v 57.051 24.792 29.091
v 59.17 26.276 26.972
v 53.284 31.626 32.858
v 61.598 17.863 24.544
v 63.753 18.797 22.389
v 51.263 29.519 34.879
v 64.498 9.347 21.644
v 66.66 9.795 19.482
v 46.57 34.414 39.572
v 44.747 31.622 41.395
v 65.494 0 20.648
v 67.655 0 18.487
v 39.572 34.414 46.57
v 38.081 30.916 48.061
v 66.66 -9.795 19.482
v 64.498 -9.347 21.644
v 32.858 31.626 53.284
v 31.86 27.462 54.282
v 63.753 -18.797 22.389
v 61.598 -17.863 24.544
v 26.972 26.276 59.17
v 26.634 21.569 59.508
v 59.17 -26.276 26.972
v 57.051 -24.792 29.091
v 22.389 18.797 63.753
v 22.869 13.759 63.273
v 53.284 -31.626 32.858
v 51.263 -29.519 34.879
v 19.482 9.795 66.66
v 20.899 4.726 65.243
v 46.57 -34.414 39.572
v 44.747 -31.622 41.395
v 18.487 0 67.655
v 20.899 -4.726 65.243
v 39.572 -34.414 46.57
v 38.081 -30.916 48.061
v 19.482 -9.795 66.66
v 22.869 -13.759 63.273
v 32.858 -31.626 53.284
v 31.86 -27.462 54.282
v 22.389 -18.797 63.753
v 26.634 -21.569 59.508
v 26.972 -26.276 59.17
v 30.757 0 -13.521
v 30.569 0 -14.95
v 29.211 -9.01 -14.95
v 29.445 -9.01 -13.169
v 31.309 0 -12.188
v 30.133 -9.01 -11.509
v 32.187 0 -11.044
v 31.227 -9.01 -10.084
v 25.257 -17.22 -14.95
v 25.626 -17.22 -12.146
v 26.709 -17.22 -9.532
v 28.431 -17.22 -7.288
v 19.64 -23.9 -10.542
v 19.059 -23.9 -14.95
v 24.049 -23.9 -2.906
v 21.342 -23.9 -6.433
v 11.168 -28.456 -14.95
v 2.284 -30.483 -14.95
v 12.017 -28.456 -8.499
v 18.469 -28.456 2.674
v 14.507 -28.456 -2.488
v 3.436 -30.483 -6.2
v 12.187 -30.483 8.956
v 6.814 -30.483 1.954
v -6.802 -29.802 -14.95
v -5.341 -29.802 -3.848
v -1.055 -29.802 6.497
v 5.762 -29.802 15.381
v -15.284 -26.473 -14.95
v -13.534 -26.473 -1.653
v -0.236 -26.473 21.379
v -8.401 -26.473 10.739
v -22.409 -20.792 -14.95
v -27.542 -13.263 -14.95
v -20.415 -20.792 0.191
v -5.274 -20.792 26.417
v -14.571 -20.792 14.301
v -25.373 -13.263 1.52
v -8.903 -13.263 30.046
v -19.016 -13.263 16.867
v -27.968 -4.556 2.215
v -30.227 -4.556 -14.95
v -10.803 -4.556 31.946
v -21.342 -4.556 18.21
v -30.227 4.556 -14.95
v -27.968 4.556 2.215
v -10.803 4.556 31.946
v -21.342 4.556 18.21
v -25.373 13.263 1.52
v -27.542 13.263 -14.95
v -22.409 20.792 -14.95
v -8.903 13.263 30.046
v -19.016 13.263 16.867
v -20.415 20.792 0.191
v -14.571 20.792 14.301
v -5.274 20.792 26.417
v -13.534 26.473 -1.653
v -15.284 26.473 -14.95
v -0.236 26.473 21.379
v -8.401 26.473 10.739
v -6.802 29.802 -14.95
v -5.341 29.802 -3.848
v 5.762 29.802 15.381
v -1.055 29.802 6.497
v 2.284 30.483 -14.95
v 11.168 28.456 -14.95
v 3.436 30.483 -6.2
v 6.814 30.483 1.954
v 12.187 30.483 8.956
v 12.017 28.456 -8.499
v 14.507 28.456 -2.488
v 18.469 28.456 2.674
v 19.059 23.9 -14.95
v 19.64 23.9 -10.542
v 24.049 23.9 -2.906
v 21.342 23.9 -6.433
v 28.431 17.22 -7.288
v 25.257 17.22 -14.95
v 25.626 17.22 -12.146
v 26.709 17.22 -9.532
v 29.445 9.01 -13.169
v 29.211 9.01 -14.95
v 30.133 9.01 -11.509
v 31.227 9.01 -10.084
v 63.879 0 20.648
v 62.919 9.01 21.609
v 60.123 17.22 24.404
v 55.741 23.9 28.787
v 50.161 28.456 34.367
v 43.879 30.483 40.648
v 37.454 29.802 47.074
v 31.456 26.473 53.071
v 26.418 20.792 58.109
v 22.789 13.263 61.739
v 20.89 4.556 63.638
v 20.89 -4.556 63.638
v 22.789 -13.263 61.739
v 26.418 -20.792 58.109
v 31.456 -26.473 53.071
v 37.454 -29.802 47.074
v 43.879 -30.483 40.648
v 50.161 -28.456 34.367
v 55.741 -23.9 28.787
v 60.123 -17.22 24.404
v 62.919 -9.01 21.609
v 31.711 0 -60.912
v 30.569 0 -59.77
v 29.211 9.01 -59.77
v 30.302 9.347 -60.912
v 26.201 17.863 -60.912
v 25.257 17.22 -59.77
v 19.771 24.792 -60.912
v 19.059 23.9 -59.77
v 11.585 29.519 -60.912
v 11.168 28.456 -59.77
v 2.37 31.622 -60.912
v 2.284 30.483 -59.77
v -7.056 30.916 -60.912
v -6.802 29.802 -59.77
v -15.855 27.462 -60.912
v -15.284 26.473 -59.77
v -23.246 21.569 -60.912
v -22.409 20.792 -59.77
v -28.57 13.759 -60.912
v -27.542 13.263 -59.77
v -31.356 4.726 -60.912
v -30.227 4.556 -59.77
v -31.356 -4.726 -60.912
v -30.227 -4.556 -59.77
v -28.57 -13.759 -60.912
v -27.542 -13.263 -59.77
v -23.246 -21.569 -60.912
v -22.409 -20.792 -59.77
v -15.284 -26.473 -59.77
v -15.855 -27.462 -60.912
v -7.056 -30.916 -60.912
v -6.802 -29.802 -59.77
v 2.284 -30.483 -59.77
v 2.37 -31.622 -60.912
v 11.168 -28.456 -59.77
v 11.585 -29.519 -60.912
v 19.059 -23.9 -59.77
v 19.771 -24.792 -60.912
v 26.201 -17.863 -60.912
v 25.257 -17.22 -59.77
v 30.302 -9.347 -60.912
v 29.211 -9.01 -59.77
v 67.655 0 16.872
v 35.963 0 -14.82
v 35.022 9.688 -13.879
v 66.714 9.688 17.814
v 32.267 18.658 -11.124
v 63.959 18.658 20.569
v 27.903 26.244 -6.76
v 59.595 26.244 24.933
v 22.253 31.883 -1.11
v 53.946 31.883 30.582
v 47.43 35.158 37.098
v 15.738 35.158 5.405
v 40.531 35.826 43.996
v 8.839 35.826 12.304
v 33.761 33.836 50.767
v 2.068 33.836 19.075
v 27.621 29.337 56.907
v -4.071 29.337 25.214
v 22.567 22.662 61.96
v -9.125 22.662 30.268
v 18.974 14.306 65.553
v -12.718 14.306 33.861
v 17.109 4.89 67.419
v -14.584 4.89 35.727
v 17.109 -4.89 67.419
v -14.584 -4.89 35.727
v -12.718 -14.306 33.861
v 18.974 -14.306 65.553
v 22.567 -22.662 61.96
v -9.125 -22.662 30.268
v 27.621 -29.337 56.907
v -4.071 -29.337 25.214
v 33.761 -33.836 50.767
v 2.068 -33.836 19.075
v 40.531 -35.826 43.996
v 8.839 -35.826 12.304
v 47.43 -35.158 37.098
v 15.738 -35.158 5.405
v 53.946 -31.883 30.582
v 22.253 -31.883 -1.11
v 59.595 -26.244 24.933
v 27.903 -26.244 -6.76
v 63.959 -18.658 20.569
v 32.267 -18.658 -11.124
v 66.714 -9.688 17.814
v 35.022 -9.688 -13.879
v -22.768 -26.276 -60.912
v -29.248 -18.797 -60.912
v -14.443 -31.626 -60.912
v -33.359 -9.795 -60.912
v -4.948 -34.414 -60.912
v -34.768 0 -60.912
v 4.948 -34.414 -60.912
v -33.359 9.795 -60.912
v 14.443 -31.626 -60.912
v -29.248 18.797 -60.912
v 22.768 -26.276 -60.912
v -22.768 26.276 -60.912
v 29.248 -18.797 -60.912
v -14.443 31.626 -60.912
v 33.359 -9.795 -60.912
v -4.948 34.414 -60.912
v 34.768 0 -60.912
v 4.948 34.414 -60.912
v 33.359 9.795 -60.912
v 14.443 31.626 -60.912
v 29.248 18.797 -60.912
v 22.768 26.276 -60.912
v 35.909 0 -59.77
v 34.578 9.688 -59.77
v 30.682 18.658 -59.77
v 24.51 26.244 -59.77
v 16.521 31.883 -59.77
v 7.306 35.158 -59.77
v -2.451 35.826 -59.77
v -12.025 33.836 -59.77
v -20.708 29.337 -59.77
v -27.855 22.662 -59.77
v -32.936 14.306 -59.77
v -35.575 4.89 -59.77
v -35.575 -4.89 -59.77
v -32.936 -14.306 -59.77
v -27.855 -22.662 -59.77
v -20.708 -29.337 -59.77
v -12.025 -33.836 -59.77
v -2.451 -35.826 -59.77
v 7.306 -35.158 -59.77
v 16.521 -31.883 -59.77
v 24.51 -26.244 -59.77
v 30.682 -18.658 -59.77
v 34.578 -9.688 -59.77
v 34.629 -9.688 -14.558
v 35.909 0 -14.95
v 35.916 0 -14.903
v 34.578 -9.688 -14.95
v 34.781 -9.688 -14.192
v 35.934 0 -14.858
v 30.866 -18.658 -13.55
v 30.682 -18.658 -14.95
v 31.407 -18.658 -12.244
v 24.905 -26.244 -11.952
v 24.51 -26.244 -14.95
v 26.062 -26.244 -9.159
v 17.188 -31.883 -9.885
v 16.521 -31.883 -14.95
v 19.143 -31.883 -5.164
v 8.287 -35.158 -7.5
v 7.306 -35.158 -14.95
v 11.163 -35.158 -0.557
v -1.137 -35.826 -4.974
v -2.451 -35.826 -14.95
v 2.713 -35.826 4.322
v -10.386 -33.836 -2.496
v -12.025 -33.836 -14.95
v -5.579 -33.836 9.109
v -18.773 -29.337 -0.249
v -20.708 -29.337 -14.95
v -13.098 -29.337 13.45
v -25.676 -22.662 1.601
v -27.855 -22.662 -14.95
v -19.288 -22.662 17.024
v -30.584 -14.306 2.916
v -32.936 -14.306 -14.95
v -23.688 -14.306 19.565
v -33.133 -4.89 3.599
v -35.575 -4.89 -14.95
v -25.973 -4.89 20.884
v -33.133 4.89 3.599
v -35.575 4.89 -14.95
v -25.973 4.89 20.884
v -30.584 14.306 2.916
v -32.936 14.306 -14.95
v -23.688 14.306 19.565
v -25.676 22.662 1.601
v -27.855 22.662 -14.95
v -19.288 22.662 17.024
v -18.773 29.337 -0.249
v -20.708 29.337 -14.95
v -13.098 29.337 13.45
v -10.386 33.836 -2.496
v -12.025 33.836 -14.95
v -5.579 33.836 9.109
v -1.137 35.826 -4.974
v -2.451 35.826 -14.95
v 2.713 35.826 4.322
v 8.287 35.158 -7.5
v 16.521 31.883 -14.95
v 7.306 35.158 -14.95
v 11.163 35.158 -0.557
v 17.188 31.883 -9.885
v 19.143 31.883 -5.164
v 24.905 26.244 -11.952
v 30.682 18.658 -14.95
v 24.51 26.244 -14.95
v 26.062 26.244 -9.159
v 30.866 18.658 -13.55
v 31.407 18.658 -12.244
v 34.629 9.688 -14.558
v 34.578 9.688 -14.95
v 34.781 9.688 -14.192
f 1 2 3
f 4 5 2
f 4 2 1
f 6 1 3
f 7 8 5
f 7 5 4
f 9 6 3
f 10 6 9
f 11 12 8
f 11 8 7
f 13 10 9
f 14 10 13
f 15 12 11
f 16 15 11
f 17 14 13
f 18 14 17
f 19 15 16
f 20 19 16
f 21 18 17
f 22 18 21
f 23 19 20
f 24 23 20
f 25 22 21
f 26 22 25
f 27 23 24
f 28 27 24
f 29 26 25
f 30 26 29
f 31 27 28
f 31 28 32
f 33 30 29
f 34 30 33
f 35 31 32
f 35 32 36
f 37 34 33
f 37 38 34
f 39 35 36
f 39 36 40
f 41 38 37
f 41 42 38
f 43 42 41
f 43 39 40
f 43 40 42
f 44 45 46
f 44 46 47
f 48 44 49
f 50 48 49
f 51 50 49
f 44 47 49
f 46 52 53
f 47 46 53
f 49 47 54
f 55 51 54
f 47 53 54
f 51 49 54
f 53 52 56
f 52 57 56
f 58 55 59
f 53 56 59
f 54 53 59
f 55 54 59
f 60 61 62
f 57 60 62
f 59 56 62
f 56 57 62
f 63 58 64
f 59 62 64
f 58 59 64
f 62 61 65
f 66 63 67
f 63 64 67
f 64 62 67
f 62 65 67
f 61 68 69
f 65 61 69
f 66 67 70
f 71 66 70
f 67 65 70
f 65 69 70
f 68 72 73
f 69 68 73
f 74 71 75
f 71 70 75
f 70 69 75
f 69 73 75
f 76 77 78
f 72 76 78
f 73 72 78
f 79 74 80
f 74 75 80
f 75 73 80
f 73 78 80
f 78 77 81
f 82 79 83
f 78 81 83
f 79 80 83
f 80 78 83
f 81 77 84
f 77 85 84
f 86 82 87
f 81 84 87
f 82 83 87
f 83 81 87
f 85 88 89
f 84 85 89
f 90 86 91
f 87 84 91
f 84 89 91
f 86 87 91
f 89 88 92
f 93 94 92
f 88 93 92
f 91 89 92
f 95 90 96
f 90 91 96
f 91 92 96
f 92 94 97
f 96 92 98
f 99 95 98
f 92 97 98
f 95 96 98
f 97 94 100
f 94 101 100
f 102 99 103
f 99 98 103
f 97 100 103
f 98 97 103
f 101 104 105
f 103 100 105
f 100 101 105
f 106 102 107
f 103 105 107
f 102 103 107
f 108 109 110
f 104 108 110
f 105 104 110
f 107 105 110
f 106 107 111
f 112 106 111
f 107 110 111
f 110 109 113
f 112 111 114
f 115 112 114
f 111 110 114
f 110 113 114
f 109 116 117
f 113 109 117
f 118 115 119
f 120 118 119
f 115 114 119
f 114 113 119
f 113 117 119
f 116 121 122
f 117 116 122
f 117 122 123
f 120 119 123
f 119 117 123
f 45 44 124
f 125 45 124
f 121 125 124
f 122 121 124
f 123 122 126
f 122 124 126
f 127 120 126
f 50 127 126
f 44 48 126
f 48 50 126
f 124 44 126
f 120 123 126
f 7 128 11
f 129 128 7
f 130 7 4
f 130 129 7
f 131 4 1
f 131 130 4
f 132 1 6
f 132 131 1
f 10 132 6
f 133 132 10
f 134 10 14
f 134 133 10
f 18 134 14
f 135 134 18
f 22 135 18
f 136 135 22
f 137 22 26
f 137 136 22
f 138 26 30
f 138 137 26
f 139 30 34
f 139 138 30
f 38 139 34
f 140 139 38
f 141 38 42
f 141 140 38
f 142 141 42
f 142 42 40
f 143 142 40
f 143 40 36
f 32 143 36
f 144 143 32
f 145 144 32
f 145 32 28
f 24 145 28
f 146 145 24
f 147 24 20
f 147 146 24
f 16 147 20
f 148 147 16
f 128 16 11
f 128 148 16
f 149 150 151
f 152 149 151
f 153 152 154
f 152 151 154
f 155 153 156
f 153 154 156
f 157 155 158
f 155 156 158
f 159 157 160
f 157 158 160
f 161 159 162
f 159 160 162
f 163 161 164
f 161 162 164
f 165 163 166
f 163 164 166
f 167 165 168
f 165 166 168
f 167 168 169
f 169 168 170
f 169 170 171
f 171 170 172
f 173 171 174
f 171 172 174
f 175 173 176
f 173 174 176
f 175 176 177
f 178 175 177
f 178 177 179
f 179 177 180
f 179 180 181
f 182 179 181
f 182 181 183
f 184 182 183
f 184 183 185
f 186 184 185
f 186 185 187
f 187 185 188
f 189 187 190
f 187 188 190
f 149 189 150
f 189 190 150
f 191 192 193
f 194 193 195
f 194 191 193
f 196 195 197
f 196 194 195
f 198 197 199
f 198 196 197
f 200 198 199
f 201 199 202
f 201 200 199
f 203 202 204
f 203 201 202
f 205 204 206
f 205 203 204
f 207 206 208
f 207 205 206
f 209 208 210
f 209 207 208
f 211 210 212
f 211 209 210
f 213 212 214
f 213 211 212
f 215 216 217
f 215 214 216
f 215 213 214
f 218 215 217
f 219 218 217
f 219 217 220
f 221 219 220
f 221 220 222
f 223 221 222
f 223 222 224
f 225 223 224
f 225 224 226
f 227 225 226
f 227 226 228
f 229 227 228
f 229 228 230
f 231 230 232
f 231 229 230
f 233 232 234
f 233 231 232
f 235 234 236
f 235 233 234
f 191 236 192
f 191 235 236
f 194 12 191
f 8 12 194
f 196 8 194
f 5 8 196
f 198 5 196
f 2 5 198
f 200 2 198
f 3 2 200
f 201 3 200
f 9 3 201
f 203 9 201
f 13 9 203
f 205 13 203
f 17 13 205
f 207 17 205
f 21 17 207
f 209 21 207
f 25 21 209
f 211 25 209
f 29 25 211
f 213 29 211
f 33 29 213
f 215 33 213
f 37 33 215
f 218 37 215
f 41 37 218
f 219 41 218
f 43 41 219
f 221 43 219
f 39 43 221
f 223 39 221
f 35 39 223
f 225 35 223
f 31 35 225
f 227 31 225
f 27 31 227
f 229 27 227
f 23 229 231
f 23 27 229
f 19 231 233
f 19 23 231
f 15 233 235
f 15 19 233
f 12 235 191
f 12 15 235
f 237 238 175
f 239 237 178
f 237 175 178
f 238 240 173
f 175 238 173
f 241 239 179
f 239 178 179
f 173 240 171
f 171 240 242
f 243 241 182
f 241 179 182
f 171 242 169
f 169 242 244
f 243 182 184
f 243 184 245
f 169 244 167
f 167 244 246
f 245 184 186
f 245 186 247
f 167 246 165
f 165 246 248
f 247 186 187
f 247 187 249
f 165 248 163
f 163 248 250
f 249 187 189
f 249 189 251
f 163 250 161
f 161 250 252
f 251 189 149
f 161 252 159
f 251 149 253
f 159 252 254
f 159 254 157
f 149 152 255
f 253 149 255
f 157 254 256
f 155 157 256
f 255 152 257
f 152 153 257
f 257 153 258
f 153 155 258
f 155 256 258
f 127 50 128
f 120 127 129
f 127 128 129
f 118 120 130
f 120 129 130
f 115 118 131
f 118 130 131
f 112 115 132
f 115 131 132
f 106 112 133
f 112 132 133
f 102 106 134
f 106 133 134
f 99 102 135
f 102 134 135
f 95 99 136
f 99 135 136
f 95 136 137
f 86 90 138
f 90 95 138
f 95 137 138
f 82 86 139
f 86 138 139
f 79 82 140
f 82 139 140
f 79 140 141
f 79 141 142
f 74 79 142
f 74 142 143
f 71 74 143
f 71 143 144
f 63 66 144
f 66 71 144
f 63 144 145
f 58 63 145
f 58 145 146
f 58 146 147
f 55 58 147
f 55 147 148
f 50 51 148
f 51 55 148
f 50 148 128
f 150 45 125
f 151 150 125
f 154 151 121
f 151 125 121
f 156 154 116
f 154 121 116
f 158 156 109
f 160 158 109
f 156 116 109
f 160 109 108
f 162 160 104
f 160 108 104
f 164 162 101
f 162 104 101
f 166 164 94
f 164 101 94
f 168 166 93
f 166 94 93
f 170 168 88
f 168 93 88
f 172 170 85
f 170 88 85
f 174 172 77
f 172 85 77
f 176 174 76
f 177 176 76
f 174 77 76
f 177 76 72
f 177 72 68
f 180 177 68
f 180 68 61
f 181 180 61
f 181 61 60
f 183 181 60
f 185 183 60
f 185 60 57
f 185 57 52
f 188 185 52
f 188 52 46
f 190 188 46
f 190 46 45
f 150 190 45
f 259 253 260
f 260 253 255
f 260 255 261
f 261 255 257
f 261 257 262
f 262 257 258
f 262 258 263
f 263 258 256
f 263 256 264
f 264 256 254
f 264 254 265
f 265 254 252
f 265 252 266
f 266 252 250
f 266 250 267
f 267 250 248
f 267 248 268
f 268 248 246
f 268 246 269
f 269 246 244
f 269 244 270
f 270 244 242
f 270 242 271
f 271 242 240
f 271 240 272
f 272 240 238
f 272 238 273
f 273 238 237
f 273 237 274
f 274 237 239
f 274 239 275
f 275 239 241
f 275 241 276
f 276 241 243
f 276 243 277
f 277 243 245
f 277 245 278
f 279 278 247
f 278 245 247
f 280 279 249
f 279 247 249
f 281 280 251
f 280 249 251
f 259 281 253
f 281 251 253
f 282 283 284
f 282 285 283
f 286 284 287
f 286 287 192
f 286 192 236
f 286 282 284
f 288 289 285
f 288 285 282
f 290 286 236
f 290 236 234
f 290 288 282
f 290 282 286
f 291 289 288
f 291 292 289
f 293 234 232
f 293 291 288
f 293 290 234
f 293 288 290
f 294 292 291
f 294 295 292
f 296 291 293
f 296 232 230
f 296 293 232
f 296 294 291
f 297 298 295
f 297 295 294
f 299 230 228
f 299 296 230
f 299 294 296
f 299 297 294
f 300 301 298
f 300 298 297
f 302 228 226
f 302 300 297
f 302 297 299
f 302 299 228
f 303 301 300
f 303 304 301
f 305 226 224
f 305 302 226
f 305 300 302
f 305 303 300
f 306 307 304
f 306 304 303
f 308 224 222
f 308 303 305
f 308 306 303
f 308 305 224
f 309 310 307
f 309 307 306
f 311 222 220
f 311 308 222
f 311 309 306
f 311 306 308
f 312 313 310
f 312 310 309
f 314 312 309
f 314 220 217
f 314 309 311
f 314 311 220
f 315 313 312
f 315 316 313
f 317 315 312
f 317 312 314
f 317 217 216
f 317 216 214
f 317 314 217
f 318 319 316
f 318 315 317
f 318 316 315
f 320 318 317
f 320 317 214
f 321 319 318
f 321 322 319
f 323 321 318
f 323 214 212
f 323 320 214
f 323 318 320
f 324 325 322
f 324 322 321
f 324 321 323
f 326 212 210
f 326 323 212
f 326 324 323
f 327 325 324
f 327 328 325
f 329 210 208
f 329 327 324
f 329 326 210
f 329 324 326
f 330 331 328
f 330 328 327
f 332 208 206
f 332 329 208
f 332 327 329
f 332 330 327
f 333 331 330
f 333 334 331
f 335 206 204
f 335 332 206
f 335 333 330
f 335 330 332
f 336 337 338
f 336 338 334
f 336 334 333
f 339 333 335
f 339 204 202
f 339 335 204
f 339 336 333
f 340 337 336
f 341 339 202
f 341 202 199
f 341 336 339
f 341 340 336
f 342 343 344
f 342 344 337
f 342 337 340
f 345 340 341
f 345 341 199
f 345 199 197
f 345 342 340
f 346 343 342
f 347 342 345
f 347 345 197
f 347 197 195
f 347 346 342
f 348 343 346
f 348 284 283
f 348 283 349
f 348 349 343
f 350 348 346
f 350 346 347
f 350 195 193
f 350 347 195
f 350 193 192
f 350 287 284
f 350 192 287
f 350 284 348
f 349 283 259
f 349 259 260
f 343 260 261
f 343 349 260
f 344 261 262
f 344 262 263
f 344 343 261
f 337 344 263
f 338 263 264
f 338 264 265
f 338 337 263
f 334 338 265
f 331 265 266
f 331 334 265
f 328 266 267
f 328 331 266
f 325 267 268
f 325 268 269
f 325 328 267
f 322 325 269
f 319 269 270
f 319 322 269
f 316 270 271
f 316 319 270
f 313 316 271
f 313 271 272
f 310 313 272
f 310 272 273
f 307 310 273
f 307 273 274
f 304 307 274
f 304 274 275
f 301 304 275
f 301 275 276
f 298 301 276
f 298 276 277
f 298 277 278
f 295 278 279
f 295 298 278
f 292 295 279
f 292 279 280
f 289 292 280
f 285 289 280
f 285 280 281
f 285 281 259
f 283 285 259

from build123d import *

# Parameters (mm, degrees)
F2_R     = 24.765
F2_R_2   = 21.082
F4_SIZE  = 0.7874
F5_SCALE = 1.45


with BuildPart() as f3:
    # F3: sweep along a path in F0
    with BuildLine(Plane.XZ) as f3_path:
        Line((0, -42.0079988722), (0, -10.3106039946))
        ThreePointArc((0, -10.3106039946), (1.8947906767, -0.7848479962), (7.2906980027, 7.2906980027))
        Line((7.2906980027, 7.2906980027), (29.7041408666, 29.7041408666))
    # F2 (on plane+point) → F3 (sweep)
    with BuildSketch(Plane.XY.offset(-42.0079988722)):
        Circle(F2_R)
        Circle(F2_R_2, mode=Mode.SUBTRACT)
    sweep(path=f3_path.line)

    # F4
    f4_edges = [f3.edges().sort_by_distance(p)[0] for p in [
        (12.192641, 0, 47.21564),
        (14.796916, 0, 44.611366),
        (-21.082, 0, -42.007999),
        (-24.765, 0, -42.007999),
    ]]
    chamfer(f4_edges, length=F4_SIZE)


with BuildPart() as f3_1:
    # F5: moved
    add(f3.part.scale(F5_SCALE))


solid = f3_1.part
